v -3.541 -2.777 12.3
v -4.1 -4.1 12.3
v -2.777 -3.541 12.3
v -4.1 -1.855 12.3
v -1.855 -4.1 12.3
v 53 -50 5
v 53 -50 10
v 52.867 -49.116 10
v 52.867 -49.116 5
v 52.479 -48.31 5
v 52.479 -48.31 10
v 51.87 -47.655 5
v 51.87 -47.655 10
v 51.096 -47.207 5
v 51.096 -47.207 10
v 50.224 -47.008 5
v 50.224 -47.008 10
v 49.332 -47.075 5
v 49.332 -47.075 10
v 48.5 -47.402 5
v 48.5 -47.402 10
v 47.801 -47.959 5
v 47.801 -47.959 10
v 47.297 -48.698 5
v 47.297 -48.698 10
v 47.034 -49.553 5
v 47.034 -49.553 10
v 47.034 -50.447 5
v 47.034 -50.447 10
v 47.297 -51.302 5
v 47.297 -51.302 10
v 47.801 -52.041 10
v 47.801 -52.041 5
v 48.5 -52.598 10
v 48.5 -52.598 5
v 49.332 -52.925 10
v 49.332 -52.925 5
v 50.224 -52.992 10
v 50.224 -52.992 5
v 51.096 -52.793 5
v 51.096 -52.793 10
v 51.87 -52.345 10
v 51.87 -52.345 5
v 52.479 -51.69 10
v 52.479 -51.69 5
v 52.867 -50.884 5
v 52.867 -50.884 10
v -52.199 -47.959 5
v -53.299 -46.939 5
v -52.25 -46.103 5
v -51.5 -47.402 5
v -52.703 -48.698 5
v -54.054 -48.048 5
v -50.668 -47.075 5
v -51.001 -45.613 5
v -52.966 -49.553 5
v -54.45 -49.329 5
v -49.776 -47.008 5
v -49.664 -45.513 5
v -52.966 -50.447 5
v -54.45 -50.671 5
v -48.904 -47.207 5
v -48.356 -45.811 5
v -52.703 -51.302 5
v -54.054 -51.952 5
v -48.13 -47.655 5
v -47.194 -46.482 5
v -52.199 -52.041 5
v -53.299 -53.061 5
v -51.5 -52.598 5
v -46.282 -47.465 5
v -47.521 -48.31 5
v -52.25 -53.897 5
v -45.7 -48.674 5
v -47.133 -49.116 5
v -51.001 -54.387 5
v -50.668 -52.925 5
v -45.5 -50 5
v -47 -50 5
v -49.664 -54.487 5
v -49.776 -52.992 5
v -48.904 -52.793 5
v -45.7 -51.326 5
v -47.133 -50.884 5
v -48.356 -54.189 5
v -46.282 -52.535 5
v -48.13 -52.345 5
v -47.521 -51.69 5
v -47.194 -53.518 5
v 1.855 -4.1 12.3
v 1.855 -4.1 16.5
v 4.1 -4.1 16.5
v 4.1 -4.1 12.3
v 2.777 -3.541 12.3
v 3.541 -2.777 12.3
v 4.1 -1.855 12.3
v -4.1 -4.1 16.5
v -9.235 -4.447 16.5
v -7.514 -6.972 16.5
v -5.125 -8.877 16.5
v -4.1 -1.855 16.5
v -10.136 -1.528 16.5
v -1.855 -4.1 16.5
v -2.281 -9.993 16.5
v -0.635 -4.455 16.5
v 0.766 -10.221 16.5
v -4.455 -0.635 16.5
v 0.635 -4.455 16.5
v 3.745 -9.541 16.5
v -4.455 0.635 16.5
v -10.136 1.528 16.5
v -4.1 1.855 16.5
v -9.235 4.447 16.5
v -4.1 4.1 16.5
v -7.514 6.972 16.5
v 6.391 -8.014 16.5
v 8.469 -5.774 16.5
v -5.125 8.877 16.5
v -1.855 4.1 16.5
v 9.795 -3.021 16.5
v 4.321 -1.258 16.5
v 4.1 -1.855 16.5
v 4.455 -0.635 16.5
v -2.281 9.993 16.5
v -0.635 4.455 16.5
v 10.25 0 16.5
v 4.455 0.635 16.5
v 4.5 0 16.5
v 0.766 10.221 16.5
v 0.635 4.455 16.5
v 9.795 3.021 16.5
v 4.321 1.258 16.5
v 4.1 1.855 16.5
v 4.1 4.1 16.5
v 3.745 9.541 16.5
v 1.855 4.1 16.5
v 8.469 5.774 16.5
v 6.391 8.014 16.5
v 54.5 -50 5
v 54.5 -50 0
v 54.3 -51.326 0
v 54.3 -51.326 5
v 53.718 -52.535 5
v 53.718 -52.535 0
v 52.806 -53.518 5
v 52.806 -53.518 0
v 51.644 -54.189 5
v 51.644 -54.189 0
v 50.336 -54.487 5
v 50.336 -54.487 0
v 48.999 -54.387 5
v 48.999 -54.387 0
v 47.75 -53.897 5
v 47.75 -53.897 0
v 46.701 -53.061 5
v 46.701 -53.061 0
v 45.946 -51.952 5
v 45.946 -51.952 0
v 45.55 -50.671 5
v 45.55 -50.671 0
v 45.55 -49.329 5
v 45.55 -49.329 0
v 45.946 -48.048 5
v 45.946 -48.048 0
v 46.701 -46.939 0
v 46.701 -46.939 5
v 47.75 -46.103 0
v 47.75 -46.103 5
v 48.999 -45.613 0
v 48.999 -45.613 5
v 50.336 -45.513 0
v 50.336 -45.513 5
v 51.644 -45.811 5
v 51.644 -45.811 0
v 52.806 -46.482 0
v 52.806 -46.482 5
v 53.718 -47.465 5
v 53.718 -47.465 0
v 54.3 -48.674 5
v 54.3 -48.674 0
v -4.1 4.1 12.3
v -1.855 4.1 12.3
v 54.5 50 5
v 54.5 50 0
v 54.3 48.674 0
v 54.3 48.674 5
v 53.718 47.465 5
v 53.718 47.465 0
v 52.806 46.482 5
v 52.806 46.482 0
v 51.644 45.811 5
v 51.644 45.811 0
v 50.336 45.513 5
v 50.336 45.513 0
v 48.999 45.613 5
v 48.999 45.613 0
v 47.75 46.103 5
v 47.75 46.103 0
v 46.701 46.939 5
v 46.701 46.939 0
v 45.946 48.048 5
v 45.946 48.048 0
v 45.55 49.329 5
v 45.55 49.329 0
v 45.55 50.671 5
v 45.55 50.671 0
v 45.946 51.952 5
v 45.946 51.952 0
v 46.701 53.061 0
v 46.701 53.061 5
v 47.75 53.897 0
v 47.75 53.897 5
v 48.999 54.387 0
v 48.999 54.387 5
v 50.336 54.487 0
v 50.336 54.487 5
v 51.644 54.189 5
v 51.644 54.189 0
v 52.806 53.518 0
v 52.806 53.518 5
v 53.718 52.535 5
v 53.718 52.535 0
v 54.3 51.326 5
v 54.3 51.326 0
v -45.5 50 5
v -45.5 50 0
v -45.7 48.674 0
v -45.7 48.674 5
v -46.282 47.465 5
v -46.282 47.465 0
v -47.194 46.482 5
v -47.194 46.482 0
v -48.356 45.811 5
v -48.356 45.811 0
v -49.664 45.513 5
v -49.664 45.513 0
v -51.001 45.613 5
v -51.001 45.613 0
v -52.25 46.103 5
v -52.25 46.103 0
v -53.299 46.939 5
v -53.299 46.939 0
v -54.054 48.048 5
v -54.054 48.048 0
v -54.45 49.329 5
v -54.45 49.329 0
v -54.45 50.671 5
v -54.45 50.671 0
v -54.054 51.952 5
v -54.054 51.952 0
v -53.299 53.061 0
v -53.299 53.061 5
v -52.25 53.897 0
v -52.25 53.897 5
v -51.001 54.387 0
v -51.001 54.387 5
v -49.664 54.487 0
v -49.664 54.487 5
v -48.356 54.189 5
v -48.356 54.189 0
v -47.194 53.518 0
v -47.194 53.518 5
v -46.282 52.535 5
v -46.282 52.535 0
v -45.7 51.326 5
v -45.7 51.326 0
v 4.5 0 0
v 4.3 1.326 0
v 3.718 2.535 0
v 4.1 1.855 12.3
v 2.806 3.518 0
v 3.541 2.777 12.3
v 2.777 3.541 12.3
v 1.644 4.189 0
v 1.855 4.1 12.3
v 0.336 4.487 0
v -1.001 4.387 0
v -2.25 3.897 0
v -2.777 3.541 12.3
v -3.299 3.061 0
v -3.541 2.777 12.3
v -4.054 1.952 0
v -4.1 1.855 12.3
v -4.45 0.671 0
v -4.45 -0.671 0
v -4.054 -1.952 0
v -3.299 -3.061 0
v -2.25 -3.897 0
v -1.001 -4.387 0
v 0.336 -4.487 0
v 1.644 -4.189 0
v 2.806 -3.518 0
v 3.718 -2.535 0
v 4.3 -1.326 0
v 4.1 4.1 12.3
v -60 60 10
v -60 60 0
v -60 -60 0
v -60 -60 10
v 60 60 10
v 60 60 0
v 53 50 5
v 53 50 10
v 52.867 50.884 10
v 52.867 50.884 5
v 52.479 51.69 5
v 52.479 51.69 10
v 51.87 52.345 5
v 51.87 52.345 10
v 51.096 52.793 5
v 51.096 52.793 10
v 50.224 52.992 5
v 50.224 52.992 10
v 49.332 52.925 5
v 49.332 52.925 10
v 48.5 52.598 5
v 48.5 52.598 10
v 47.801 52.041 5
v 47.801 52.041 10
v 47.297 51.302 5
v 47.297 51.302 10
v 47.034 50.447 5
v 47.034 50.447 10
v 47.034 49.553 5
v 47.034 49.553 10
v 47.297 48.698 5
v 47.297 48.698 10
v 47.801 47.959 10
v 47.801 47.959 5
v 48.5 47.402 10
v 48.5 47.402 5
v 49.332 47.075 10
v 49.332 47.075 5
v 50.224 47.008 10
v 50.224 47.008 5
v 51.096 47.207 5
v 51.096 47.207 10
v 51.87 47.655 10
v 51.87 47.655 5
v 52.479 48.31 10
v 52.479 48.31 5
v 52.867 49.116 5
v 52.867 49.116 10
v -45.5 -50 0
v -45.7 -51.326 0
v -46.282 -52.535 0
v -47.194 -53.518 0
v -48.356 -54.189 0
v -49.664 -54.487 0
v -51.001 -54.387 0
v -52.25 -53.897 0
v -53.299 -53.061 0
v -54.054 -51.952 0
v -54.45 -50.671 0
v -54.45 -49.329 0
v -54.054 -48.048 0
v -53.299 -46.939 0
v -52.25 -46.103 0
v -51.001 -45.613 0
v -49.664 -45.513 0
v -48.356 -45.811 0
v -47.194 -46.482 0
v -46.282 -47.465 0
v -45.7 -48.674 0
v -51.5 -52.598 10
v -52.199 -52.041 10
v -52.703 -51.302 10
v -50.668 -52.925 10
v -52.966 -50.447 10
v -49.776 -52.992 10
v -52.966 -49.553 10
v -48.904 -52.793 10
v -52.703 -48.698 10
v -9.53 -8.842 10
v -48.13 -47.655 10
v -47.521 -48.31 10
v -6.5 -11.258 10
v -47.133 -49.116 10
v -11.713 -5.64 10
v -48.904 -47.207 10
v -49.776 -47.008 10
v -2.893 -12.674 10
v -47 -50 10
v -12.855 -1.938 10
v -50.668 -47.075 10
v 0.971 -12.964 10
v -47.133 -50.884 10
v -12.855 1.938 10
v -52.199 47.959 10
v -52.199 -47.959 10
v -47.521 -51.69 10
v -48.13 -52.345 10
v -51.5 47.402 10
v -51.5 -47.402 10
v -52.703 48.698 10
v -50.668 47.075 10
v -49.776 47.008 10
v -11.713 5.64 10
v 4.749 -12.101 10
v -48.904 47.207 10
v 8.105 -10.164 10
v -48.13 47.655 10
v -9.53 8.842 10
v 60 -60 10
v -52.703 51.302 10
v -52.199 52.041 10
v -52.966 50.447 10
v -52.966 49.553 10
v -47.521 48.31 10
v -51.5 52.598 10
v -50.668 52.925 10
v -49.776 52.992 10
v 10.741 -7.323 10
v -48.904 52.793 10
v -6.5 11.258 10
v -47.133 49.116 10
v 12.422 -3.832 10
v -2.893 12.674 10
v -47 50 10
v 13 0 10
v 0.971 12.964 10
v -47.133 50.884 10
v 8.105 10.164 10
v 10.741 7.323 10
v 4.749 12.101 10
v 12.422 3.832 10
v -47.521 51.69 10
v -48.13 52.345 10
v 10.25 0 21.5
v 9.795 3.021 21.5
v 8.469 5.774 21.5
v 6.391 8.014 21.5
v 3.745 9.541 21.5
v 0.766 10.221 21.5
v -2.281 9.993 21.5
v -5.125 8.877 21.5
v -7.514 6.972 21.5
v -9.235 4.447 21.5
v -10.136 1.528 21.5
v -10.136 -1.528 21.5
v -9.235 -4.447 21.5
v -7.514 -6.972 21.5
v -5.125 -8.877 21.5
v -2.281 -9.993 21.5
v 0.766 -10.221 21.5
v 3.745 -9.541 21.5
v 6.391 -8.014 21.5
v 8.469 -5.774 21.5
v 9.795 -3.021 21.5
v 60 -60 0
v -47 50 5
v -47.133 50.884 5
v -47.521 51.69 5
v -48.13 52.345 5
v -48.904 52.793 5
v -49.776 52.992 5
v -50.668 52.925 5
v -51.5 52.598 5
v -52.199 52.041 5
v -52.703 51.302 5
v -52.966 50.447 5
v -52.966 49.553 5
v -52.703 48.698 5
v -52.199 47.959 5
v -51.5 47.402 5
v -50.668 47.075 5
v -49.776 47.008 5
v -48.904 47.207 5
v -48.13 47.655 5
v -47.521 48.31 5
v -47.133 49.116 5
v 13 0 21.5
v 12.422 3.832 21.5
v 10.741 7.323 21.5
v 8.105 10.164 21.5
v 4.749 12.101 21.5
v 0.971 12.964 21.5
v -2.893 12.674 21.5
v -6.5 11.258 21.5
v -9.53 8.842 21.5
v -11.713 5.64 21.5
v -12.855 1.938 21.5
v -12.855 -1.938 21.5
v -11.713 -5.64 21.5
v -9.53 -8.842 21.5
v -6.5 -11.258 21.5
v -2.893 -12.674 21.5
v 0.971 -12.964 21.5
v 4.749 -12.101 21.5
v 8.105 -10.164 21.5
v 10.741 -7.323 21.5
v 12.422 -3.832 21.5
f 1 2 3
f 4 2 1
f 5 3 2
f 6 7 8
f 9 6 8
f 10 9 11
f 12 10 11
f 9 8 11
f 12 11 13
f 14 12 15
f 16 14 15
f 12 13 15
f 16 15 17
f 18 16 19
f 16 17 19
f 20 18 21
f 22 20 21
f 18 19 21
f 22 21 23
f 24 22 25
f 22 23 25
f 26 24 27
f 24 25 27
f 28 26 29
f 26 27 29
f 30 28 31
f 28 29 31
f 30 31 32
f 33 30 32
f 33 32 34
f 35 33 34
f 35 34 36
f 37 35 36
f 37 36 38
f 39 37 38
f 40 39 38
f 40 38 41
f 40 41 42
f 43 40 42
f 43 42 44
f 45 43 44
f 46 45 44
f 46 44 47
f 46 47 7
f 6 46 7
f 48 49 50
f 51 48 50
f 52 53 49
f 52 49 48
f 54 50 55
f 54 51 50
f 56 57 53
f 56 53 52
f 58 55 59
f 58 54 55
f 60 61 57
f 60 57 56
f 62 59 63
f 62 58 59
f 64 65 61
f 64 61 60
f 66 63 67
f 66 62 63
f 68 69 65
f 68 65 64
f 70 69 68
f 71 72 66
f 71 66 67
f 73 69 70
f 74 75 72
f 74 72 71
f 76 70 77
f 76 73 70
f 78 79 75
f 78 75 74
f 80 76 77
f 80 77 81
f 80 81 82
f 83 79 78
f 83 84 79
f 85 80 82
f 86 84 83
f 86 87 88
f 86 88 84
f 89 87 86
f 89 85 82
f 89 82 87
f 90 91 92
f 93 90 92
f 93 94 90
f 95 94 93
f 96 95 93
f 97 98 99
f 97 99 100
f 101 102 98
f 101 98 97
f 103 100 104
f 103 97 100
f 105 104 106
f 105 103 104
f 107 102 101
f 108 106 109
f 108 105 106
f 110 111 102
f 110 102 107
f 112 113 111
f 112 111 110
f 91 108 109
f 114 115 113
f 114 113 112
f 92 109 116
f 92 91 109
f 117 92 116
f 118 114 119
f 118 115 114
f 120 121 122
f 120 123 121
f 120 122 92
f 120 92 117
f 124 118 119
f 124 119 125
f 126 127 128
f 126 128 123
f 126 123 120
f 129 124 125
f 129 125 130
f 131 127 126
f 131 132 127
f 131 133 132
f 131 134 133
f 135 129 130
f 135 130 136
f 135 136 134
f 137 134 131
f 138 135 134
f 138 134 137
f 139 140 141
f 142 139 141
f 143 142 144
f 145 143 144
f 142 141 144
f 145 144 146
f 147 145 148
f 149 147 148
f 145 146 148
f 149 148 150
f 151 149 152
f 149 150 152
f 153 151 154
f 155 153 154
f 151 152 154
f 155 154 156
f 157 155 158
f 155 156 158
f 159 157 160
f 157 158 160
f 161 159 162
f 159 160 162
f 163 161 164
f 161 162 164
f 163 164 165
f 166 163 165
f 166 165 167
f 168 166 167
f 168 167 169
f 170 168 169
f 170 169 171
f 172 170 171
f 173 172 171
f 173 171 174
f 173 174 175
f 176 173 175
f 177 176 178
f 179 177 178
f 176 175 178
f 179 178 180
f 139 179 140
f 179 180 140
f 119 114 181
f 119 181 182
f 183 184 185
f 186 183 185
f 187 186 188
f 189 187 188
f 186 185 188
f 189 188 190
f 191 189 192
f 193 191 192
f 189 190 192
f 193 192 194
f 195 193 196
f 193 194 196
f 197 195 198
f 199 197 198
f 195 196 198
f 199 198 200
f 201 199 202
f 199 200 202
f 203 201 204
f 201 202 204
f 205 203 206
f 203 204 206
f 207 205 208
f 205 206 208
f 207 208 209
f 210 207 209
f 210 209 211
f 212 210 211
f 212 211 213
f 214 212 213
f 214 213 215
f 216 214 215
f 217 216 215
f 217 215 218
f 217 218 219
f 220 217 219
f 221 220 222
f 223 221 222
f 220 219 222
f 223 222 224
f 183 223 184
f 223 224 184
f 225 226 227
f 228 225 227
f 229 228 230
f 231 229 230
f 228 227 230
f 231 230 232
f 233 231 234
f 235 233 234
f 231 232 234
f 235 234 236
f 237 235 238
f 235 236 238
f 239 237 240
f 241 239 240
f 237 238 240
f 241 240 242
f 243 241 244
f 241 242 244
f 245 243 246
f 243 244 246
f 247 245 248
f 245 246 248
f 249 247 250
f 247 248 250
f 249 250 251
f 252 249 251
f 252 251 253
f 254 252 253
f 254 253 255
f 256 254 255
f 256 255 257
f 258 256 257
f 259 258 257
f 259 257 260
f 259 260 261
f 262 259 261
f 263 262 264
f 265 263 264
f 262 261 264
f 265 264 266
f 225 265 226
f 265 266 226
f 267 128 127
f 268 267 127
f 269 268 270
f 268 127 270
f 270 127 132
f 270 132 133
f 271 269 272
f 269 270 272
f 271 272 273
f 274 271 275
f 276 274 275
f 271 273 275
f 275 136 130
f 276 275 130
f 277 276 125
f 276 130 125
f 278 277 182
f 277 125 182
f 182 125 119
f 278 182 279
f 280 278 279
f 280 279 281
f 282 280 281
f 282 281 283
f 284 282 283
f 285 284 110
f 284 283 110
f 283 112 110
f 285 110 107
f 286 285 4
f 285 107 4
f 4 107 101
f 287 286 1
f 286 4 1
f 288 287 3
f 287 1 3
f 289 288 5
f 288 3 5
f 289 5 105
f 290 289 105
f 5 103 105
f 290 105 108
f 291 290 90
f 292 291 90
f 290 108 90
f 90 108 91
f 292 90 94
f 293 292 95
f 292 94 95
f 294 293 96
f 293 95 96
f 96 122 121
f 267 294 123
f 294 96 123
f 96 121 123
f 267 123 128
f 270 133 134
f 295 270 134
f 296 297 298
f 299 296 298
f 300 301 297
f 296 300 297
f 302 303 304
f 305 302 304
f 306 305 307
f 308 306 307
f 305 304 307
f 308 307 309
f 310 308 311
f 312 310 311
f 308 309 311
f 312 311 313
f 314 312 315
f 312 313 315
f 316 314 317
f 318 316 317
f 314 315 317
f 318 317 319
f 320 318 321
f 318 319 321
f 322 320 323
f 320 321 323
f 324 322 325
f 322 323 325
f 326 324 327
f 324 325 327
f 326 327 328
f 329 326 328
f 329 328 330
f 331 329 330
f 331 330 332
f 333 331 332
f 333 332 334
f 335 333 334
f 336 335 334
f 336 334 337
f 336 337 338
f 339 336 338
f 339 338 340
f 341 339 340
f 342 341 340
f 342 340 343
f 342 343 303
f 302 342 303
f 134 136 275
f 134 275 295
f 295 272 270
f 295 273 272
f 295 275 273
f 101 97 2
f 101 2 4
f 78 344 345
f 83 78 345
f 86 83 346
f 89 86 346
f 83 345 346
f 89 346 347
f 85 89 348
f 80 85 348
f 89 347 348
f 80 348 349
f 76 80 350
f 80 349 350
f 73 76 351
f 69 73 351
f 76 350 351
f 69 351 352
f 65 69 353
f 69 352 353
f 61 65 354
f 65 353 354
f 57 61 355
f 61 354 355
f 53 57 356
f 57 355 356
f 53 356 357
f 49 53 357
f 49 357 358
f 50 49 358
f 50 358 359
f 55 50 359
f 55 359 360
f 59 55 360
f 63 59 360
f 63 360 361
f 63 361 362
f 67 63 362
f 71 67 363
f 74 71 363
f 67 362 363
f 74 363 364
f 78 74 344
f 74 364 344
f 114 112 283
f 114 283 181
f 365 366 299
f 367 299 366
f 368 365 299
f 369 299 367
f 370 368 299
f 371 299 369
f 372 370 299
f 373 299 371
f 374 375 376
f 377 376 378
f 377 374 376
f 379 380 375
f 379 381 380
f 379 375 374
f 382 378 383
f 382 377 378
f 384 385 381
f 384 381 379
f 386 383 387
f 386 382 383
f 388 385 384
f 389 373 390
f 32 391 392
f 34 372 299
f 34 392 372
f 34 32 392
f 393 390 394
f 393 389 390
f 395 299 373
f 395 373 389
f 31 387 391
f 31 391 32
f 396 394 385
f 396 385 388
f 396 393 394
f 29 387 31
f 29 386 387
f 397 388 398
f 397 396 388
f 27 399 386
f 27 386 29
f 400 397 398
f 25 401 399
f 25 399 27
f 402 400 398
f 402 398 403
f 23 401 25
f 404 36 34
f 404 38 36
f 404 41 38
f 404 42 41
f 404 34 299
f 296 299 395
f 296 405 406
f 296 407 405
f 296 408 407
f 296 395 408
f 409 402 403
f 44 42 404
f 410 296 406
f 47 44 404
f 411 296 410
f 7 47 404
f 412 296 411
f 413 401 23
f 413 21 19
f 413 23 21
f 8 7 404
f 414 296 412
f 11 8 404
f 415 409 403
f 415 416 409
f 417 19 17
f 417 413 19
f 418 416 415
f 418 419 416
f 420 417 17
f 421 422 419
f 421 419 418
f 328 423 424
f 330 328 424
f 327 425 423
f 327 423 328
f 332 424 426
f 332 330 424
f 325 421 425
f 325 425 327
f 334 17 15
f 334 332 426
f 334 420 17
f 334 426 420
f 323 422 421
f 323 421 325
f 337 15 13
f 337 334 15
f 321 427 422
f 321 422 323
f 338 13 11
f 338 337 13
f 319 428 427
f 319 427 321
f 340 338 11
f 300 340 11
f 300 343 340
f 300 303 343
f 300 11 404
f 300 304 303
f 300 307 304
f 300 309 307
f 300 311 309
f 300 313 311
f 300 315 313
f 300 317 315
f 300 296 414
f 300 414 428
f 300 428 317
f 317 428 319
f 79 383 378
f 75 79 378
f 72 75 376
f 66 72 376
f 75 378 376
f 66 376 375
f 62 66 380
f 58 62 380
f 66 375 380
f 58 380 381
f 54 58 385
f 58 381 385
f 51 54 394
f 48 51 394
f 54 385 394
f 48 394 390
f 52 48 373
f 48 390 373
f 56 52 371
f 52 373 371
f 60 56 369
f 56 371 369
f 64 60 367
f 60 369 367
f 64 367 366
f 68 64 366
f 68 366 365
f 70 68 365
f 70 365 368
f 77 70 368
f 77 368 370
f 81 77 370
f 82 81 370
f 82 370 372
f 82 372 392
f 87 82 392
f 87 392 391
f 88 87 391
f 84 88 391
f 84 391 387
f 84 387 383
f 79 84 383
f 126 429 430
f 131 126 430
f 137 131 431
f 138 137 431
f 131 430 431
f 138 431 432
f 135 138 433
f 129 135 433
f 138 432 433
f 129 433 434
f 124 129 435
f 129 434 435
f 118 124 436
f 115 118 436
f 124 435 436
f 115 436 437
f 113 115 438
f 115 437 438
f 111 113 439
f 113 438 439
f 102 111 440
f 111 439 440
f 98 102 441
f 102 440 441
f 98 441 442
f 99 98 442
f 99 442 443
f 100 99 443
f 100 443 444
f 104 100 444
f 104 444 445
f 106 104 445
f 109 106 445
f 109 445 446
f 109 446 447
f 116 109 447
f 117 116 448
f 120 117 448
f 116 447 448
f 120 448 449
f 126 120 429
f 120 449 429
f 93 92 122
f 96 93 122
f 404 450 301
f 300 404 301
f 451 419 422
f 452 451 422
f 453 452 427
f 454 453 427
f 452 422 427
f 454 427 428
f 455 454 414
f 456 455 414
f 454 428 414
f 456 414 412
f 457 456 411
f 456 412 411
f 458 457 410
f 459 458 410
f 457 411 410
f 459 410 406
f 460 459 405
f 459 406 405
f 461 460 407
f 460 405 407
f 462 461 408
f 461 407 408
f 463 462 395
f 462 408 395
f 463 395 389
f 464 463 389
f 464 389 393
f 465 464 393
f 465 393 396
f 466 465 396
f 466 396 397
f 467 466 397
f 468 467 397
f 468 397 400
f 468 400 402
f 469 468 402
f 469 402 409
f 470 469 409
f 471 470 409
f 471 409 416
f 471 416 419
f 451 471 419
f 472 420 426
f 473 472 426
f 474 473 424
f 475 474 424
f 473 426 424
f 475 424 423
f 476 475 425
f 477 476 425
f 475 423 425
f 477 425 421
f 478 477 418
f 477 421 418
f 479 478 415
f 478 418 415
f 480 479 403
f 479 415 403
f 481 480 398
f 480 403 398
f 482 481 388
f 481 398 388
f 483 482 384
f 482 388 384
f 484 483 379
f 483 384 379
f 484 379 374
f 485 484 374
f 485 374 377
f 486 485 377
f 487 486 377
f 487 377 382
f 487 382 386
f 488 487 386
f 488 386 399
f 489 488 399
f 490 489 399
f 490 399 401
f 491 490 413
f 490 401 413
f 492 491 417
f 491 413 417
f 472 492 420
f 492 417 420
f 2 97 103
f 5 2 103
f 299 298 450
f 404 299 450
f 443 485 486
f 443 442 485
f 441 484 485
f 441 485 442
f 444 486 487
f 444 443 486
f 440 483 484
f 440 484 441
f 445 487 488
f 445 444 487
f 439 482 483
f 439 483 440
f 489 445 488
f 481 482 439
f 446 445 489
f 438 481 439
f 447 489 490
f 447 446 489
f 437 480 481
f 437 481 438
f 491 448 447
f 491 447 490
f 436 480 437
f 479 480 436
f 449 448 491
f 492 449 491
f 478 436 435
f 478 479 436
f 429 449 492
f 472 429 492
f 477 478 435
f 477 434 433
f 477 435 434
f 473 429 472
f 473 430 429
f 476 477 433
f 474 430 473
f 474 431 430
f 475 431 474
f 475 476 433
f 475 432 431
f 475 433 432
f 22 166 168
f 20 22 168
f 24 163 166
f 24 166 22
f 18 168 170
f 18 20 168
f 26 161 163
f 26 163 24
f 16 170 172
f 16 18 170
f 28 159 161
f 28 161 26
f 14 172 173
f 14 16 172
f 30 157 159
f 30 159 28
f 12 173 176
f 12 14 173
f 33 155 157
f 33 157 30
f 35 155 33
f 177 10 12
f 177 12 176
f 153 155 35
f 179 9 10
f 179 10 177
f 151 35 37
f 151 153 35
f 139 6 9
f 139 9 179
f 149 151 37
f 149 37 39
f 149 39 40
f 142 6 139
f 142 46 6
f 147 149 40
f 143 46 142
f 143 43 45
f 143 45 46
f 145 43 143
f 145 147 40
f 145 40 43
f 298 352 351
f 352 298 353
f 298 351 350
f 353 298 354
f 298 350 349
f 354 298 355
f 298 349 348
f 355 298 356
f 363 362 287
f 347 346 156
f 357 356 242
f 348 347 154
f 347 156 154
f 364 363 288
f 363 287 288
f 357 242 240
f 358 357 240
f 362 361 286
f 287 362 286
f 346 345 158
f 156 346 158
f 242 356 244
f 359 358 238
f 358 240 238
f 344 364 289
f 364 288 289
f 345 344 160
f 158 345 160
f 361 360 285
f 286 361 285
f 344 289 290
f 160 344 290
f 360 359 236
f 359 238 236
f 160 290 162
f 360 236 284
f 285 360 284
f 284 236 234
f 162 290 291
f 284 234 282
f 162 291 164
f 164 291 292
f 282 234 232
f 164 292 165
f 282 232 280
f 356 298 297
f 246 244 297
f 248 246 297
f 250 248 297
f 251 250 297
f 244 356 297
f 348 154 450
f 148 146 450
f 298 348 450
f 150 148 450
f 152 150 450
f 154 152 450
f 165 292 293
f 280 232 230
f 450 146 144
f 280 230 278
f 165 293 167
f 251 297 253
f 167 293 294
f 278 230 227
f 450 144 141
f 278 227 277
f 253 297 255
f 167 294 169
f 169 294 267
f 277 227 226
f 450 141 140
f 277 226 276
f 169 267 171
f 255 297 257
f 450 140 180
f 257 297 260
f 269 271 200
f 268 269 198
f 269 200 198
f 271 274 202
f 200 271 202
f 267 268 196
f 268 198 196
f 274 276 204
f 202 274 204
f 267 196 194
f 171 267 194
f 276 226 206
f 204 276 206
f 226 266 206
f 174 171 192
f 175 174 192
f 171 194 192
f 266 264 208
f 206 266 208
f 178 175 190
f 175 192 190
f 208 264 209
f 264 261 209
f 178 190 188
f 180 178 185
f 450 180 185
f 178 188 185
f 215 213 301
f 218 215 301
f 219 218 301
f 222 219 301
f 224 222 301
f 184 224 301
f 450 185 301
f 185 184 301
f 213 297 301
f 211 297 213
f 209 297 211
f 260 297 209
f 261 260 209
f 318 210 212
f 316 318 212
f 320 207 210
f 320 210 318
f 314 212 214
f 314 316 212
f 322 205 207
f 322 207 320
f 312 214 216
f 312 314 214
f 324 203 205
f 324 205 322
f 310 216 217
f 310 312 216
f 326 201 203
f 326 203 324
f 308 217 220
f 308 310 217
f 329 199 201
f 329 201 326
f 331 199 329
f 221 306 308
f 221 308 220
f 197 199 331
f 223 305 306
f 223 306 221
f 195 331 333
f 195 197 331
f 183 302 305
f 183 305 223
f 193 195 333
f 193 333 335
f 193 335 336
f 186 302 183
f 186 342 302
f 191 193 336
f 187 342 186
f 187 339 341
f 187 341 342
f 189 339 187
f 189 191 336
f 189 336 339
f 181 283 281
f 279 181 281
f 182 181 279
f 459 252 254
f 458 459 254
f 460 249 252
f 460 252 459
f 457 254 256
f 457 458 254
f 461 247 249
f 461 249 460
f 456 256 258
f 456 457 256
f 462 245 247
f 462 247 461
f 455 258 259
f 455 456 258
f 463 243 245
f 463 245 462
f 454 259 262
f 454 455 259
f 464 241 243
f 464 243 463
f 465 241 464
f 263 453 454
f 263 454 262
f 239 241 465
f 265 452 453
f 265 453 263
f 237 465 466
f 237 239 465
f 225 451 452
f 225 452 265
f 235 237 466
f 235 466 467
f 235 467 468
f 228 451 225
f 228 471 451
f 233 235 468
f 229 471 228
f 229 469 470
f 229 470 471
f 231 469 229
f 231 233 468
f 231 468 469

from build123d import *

# Parameters (mm, degrees)
F0_W      = 60
F0_H      = 60
F1_DEPTH  = 10
F2_R      = 3
F3_DEPTH  = 25
F4_R      = 4.5
F5_DEPTH  = 5
F6_R      = 13
F7_DEPTH  = 11.5
F8_R      = 4.5
F9_DEPTH  = 25
F10_W     = 8.2
F10_H     = 8.2
F11_DEPTH = 9.2
F12_R     = 10.25
F13_DEPTH = 5


with BuildPart() as f1:
    # F0 (on Top) → F1 (new body)
    with BuildSketch(Plane.XY):
        with Locations((-30, 30)):
            Rectangle(F0_W, F0_H)
        with Locations((-30, -30)):
            Rectangle(F0_W, F0_H)
        with Locations((30, 30)):
            Rectangle(F0_W, F0_H)
        with Locations((30, -30)):
            Rectangle(F0_W, F0_H)
    extrude(amount=F1_DEPTH)

    # F2 (on face) → F3 (cut)
    with BuildSketch(Plane.XY.offset(10)):
        with Locations((-50, 50)):
            Circle(F2_R)
        with Locations((50, 50)):
            Circle(F2_R)
        with Locations((-50, -50)):
            Circle(F2_R)
        with Locations((50, -50)):
            Circle(F2_R)
    extrude(amount=-F3_DEPTH, mode=Mode.SUBTRACT)

    # F4 (on face) → F5 (cut)
    with BuildSketch(Plane(origin=(0, 0, 0), x_dir=(1, 0, 0), z_dir=(0, 0, -1))):
        with Locations((-50, 50)):
            Circle(F4_R)
        with Locations((50, 50)):
            Circle(F4_R)
        with Locations((-50, -50)):
            Circle(F4_R)
        with Locations((50, -50)):
            Circle(F4_R)
    extrude(amount=-F5_DEPTH, mode=Mode.SUBTRACT)

    # F6 (on face) → F7 (join)
    with BuildSketch(Plane.XY.offset(10)):
        Circle(F6_R)
    extrude(amount=F7_DEPTH)

    # F8 (on face) → F9 (cut)
    with BuildSketch(Plane.XY.offset(21.5)):
        Circle(F8_R)
    extrude(amount=-F9_DEPTH, mode=Mode.SUBTRACT)

    # F10 (on face) → F11 (cut)
    with BuildSketch(Plane.XY.offset(21.5)):
        Rectangle(F10_W, F10_H)
    extrude(amount=-F11_DEPTH, mode=Mode.SUBTRACT)

    # F12 (on face) → F13 (cut)
    with BuildSketch(Plane.XY.offset(21.5)):
        Circle(F12_R)
    extrude(amount=-F13_DEPTH, mode=Mode.SUBTRACT)


solid = f1.part
